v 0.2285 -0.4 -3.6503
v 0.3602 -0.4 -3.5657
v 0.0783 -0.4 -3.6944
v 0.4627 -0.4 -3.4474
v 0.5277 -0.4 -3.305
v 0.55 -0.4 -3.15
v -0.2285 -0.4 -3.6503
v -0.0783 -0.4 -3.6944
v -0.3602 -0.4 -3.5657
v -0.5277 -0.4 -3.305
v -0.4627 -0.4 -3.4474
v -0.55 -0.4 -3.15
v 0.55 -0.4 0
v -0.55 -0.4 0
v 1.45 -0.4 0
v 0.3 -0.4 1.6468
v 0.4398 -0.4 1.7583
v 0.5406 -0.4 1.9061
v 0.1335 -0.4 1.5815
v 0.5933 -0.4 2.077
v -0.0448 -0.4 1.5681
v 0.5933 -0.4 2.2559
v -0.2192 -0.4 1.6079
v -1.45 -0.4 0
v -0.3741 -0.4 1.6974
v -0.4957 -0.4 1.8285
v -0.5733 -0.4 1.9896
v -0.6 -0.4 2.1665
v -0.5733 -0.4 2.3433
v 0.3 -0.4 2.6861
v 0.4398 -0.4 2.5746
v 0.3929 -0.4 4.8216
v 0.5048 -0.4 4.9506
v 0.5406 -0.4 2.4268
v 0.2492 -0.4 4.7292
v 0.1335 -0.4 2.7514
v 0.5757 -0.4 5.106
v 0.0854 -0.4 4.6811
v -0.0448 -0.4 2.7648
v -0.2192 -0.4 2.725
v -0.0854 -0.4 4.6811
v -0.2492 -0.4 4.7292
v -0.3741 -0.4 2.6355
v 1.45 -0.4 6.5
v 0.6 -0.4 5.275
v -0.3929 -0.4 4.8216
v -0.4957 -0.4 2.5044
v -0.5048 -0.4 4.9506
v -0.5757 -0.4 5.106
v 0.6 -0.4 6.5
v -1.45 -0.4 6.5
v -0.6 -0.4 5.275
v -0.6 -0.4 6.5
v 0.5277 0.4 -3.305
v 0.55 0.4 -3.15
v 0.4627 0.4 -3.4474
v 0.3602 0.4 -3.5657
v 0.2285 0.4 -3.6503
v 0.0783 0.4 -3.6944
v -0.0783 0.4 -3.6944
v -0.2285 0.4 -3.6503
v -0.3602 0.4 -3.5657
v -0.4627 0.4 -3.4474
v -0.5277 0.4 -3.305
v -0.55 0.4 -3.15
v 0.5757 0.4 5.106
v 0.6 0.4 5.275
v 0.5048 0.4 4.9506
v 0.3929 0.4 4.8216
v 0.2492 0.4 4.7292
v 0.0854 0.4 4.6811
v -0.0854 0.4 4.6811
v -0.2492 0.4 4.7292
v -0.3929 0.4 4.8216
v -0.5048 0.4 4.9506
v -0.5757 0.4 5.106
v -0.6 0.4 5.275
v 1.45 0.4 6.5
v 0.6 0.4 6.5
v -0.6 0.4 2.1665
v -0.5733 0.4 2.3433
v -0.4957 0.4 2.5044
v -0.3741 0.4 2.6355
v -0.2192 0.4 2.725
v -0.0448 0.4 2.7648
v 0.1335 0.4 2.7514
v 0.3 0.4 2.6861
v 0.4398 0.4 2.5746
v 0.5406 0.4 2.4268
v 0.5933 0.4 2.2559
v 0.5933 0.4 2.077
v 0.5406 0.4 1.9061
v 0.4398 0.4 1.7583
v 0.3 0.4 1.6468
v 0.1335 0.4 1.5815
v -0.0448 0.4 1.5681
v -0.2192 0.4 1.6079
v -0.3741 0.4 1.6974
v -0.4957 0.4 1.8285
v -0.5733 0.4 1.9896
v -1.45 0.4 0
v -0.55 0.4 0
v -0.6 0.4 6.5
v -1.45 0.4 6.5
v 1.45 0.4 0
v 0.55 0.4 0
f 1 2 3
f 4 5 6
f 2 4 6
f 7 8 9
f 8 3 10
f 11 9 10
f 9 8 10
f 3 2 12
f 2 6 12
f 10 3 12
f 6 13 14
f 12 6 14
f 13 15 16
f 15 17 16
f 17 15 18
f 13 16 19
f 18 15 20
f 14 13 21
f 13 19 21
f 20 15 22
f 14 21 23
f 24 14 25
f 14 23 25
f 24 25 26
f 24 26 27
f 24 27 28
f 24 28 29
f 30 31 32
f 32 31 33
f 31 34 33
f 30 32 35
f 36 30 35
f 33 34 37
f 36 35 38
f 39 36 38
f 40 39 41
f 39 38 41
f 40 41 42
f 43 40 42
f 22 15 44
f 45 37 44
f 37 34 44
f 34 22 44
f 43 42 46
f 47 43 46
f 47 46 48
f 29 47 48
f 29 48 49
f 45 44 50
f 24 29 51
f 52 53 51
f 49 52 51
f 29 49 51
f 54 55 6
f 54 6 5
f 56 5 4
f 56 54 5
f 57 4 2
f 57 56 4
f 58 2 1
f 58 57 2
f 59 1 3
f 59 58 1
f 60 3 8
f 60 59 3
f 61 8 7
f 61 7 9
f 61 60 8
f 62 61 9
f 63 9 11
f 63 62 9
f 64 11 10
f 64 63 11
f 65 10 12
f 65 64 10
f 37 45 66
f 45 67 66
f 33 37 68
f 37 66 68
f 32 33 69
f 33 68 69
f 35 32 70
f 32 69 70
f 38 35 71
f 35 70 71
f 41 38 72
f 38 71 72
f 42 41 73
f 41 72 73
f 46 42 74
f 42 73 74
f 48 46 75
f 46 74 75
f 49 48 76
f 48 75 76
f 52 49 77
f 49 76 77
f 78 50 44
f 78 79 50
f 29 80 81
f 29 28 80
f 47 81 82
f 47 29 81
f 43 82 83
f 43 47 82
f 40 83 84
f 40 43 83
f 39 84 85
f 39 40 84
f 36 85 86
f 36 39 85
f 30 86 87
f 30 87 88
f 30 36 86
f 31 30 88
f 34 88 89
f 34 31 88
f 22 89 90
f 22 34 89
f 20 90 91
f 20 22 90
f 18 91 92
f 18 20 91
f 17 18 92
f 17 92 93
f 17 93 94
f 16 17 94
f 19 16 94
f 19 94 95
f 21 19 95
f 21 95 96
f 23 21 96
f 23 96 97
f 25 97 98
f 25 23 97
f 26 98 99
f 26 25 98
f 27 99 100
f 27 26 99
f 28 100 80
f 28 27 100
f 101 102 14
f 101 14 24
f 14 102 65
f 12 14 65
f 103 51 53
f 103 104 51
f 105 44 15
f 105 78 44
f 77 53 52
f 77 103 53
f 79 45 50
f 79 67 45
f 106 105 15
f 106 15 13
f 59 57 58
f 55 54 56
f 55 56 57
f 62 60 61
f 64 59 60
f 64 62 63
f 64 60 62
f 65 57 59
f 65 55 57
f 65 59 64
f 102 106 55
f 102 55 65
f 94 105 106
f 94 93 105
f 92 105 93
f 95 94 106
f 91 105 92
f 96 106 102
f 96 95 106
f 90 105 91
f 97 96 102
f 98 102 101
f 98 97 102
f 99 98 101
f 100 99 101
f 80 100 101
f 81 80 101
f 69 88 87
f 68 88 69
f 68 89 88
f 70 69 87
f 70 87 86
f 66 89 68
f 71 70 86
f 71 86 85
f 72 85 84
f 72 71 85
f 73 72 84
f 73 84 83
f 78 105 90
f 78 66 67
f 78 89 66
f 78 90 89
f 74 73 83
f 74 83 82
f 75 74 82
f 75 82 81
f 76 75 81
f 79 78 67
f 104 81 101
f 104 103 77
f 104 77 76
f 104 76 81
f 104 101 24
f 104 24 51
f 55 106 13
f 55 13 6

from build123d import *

# Parameters (mm, degrees)
SKETCH_R  = 0.6
PAD_DEPTH = 0.4


with BuildPart() as part:
    # Sketch → Pad (new body, symmetric)
    with BuildSketch(Plane(origin=(0, 0, 0), x_dir=(-1, 0, 0), z_dir=(0, 1, 0))):
        with BuildLine():
            Line((-1.45, 6.5), (-1.45, 0))
            Line((-1.45, 0), (-0.55, 0))
            Line((-0.55, 0), (-0.55, -3.15))
            ThreePointArc((-0.55, -3.15), (0, -3.7), (0.55, -3.15))
            Line((0.55, 0), (0.55, -3.15))
            Line((0.55, 0), (1.45, 0))
            Line((1.45, 0), (1.45, 6.5))
            Line((1.45, 6.5), (0.6, 6.5))
            Line((0.6, 6.5), (0.6, 5.275))
            ThreePointArc((-0.6, 5.275), (0, 4.675), (0.6, 5.275))
            Line((-0.6, 5.275), (-0.6, 6.5))
            Line((-0.6, 6.5), (-1.45, 6.5))
        make_face()
        with Locations((0, 2.16645)):
            Circle(SKETCH_R, mode=Mode.SUBTRACT)
    extrude(amount=PAD_DEPTH, both=True)


solid = part.part
